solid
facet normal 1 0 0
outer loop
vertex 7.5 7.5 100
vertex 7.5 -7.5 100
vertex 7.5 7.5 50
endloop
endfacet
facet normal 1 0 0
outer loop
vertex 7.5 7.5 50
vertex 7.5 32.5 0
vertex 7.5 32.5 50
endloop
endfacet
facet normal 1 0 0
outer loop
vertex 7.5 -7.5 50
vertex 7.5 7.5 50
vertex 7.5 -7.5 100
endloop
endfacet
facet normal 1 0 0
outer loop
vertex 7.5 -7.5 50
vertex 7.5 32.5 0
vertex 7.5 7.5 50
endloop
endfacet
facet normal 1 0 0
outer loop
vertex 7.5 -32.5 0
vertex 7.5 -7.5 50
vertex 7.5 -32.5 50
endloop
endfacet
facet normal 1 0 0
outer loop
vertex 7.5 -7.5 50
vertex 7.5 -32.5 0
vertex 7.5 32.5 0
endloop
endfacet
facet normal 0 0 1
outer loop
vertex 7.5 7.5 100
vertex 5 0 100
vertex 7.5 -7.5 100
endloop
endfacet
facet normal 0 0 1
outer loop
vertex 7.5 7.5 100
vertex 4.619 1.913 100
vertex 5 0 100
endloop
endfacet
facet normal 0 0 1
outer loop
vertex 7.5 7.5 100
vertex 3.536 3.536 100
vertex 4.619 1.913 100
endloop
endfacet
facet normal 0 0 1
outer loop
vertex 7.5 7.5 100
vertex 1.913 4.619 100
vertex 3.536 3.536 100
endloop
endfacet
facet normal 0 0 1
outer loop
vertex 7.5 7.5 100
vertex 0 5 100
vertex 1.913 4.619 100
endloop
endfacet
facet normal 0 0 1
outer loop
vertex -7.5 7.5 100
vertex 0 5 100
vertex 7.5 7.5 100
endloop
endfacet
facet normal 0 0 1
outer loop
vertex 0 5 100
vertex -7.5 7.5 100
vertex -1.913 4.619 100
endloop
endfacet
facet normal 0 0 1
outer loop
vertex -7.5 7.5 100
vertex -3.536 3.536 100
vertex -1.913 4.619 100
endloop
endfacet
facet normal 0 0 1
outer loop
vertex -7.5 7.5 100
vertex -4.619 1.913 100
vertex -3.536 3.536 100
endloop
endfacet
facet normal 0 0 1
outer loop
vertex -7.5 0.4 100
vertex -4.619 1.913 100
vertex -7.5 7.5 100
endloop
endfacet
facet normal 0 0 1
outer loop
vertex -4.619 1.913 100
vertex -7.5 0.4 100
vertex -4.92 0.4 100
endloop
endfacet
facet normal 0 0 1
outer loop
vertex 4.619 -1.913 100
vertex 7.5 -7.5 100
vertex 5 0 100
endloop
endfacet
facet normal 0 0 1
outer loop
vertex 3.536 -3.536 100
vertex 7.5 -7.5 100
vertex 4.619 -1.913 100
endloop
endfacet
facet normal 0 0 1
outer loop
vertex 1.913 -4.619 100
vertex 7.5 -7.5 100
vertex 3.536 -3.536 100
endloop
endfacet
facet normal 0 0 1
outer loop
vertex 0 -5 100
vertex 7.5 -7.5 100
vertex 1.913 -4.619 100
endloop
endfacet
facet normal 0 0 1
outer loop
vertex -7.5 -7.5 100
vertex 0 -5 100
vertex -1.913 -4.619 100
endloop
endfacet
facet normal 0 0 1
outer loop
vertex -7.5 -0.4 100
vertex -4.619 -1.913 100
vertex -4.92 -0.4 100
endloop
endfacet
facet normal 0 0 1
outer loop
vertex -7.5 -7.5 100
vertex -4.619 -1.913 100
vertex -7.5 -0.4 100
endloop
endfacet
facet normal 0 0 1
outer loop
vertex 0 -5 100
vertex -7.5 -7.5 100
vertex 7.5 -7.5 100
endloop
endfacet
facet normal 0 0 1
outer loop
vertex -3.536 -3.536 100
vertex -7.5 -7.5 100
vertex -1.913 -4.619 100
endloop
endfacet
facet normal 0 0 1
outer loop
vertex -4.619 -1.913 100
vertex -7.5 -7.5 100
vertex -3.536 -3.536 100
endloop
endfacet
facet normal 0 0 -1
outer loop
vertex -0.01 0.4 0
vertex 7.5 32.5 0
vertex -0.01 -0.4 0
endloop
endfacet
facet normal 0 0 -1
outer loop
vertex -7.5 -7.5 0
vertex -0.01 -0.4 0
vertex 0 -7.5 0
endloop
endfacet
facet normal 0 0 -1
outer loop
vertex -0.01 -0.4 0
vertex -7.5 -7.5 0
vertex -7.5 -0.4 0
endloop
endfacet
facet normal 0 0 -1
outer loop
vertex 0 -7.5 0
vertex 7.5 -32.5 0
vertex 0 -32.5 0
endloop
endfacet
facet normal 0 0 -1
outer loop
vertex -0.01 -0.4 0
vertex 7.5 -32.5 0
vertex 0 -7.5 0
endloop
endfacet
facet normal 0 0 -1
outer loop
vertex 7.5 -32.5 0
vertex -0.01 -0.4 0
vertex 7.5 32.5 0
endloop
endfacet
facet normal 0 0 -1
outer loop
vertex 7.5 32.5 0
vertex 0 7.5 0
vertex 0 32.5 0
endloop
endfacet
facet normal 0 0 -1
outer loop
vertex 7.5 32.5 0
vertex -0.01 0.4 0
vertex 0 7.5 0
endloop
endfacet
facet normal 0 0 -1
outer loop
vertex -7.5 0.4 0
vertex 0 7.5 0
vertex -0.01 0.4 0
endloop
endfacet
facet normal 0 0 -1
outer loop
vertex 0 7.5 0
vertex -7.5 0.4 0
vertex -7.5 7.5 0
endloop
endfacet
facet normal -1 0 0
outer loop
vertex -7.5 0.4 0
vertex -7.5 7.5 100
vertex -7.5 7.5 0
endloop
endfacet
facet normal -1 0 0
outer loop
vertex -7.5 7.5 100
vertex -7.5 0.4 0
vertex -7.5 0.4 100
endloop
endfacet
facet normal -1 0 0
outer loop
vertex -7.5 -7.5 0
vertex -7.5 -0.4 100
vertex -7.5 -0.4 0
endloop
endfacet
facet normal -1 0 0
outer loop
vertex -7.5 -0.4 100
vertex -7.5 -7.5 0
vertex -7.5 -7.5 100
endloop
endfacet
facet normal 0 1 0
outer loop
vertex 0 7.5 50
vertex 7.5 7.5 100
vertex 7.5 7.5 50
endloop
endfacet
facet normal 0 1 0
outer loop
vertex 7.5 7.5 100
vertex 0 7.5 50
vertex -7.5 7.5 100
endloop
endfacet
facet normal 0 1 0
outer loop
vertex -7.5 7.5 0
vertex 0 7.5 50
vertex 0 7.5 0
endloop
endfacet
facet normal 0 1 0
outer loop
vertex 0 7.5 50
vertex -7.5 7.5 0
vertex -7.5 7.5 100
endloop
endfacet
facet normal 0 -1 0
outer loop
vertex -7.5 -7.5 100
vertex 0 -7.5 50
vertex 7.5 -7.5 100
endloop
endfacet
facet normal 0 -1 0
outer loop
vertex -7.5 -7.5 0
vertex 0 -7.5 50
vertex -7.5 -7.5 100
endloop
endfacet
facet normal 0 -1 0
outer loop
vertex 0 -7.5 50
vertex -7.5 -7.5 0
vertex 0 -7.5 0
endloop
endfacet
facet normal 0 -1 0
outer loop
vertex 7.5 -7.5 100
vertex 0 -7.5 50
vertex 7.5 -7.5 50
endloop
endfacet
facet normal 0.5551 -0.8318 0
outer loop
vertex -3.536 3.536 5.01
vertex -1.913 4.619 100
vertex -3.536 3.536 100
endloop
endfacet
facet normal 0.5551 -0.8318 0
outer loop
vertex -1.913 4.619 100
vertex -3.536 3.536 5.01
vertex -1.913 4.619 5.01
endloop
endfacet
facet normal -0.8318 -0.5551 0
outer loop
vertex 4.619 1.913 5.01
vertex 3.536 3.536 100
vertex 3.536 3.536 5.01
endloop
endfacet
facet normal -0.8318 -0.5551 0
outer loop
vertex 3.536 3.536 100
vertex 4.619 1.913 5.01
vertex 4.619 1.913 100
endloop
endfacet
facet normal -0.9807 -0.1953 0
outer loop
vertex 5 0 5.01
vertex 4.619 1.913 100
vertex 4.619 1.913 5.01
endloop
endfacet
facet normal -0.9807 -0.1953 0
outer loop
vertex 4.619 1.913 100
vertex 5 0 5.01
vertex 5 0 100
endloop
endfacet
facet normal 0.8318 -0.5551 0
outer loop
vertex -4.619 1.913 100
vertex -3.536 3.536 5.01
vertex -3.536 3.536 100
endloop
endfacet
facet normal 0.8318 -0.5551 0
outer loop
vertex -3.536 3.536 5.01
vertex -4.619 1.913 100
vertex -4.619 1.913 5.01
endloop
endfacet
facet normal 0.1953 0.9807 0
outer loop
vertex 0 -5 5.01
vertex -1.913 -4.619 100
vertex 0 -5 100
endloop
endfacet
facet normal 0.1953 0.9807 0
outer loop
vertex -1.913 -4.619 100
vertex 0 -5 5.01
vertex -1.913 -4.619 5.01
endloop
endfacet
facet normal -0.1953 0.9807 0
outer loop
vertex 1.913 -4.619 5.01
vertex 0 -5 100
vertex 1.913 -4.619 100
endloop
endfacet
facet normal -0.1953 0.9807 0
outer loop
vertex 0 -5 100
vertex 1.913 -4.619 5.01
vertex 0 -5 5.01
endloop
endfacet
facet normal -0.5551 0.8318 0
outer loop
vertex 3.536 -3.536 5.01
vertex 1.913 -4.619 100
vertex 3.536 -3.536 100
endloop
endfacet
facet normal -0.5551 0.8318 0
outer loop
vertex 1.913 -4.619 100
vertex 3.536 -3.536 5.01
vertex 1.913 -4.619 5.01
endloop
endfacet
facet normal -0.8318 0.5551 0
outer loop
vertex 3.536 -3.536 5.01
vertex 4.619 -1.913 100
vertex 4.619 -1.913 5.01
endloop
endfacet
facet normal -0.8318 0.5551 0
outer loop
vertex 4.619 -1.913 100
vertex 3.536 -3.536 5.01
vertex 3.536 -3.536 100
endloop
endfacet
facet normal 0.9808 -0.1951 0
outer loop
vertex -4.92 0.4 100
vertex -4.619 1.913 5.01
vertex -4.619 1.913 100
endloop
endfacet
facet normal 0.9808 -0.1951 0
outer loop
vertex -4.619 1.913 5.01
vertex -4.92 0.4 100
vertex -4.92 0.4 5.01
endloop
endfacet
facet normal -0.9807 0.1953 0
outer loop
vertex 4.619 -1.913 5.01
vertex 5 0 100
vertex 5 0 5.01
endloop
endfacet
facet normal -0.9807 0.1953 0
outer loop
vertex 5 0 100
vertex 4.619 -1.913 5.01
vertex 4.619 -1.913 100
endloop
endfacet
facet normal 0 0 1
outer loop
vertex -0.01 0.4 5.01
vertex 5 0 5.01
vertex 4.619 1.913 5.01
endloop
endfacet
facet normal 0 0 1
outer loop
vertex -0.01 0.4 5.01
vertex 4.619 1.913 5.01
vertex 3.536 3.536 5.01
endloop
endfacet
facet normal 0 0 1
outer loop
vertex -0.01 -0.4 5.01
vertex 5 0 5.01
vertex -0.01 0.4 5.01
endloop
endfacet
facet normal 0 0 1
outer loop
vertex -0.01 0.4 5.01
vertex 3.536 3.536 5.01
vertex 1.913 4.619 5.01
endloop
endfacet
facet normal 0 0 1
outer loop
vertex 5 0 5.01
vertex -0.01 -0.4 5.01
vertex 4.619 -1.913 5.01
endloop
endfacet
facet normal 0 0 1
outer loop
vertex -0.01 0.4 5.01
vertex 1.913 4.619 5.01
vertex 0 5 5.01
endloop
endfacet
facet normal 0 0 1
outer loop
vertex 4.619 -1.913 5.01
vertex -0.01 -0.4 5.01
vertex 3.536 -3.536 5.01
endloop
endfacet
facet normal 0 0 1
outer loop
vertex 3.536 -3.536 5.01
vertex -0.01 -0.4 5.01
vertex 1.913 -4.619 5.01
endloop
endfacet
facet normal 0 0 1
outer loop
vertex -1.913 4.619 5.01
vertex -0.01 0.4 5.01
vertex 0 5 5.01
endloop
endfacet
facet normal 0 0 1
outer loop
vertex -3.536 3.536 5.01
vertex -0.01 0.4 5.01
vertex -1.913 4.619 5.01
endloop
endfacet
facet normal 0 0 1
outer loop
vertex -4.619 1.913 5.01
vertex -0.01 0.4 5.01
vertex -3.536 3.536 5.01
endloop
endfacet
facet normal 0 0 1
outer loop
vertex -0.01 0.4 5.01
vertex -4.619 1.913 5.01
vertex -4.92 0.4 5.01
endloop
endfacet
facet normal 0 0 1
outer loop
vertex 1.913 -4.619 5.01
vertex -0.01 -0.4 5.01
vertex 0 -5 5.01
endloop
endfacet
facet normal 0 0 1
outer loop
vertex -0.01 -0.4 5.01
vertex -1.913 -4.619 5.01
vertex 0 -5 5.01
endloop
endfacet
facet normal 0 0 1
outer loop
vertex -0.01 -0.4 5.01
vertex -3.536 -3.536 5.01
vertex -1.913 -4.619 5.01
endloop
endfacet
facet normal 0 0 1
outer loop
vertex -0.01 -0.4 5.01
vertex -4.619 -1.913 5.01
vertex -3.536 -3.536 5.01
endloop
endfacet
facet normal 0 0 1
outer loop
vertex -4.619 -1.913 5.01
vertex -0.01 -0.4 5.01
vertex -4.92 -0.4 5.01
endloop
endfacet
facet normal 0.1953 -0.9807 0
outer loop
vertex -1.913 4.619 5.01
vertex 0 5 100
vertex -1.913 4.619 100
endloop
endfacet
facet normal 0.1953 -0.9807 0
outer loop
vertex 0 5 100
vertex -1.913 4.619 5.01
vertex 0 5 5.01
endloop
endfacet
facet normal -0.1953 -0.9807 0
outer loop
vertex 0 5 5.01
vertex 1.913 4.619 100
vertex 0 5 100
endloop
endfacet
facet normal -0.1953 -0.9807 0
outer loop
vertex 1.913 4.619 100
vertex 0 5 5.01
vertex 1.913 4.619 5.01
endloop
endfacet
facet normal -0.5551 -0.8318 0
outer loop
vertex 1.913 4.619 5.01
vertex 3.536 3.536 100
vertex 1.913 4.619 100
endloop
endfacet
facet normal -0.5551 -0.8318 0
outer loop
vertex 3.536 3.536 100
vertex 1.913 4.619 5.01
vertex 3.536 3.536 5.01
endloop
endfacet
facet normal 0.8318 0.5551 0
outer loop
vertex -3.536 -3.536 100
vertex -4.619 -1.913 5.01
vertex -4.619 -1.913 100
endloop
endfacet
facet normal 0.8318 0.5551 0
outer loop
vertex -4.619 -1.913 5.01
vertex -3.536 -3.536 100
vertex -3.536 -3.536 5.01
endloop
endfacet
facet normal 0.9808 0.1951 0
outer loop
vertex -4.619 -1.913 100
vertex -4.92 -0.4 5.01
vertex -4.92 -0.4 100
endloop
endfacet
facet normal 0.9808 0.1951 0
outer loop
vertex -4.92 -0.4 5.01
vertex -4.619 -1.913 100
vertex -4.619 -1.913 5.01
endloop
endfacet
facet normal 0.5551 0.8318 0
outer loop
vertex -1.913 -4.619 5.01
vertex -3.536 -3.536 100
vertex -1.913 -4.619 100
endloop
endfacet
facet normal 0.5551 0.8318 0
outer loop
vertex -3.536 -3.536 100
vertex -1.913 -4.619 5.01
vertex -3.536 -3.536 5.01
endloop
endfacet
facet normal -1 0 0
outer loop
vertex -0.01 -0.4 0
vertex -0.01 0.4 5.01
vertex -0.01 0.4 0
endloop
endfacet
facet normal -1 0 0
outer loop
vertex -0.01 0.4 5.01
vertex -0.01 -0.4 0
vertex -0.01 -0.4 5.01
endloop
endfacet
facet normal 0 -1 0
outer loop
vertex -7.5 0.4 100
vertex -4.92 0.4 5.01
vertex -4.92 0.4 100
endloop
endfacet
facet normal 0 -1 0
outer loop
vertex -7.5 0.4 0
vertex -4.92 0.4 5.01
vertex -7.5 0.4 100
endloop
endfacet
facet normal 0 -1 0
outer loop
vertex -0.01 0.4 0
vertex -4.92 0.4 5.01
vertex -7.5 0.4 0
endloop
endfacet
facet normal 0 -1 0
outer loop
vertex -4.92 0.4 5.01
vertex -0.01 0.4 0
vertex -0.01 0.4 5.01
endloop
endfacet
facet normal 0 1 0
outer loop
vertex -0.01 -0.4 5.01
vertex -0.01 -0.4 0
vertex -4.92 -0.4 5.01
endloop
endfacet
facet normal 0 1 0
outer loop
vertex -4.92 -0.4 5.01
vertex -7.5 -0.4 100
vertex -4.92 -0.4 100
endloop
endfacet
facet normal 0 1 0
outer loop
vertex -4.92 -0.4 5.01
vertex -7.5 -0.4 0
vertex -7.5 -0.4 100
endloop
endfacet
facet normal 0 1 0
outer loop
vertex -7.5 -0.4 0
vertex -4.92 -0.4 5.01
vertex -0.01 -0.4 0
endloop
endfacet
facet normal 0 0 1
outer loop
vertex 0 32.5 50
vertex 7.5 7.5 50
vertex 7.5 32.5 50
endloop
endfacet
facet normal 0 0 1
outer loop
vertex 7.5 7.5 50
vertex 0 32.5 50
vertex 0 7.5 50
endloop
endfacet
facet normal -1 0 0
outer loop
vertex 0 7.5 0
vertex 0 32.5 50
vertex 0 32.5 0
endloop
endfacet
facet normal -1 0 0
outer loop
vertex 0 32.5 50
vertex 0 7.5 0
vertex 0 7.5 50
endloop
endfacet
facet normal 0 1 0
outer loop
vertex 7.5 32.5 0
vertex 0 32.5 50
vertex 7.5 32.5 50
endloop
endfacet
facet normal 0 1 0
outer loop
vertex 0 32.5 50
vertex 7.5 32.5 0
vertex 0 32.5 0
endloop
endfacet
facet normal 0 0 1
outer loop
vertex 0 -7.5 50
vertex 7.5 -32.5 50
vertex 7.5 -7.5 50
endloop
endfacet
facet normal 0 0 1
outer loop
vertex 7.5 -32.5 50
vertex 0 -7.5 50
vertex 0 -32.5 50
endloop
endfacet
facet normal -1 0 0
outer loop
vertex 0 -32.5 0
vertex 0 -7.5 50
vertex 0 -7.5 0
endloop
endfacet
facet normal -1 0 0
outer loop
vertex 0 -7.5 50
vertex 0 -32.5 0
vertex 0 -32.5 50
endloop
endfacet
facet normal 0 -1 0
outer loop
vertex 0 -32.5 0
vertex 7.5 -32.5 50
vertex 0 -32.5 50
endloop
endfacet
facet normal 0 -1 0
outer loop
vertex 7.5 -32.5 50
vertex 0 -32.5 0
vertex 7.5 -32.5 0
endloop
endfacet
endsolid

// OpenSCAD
cutter_length = 100;
cutter_diameter = 15;
crayon_diameter = 10;
slit_thickness = 0.8;
wall_thickness = 5;
handle_length = cutter_length * 0.5;
handle_width = 25;
epsilon = 0.01;

union () {
     difference() {
          translate([-cutter_diameter/2, -cutter_diameter/2, 0]) {
               cube([cutter_diameter, cutter_diameter, cutter_length]);
          }
          translate([0, 0, wall_thickness + epsilon]) {
               cylinder(d=crayon_diameter, h=(cutter_length - wall_thickness));
          }
          translate([-cutter_diameter/2-epsilon, -slit_thickness/2, -epsilon]) {
               cube([cutter_diameter/2, slit_thickness, cutter_length+2*epsilon]);
          }
     }
     translate([0,cutter_diameter/2,0]) {
          cube([cutter_diameter/2,handle_width,handle_length]);
     }
     translate([0,-cutter_diameter/2-handle_width,0]) {
          cube([cutter_diameter/2,handle_width,handle_length]);
     }
         
}
